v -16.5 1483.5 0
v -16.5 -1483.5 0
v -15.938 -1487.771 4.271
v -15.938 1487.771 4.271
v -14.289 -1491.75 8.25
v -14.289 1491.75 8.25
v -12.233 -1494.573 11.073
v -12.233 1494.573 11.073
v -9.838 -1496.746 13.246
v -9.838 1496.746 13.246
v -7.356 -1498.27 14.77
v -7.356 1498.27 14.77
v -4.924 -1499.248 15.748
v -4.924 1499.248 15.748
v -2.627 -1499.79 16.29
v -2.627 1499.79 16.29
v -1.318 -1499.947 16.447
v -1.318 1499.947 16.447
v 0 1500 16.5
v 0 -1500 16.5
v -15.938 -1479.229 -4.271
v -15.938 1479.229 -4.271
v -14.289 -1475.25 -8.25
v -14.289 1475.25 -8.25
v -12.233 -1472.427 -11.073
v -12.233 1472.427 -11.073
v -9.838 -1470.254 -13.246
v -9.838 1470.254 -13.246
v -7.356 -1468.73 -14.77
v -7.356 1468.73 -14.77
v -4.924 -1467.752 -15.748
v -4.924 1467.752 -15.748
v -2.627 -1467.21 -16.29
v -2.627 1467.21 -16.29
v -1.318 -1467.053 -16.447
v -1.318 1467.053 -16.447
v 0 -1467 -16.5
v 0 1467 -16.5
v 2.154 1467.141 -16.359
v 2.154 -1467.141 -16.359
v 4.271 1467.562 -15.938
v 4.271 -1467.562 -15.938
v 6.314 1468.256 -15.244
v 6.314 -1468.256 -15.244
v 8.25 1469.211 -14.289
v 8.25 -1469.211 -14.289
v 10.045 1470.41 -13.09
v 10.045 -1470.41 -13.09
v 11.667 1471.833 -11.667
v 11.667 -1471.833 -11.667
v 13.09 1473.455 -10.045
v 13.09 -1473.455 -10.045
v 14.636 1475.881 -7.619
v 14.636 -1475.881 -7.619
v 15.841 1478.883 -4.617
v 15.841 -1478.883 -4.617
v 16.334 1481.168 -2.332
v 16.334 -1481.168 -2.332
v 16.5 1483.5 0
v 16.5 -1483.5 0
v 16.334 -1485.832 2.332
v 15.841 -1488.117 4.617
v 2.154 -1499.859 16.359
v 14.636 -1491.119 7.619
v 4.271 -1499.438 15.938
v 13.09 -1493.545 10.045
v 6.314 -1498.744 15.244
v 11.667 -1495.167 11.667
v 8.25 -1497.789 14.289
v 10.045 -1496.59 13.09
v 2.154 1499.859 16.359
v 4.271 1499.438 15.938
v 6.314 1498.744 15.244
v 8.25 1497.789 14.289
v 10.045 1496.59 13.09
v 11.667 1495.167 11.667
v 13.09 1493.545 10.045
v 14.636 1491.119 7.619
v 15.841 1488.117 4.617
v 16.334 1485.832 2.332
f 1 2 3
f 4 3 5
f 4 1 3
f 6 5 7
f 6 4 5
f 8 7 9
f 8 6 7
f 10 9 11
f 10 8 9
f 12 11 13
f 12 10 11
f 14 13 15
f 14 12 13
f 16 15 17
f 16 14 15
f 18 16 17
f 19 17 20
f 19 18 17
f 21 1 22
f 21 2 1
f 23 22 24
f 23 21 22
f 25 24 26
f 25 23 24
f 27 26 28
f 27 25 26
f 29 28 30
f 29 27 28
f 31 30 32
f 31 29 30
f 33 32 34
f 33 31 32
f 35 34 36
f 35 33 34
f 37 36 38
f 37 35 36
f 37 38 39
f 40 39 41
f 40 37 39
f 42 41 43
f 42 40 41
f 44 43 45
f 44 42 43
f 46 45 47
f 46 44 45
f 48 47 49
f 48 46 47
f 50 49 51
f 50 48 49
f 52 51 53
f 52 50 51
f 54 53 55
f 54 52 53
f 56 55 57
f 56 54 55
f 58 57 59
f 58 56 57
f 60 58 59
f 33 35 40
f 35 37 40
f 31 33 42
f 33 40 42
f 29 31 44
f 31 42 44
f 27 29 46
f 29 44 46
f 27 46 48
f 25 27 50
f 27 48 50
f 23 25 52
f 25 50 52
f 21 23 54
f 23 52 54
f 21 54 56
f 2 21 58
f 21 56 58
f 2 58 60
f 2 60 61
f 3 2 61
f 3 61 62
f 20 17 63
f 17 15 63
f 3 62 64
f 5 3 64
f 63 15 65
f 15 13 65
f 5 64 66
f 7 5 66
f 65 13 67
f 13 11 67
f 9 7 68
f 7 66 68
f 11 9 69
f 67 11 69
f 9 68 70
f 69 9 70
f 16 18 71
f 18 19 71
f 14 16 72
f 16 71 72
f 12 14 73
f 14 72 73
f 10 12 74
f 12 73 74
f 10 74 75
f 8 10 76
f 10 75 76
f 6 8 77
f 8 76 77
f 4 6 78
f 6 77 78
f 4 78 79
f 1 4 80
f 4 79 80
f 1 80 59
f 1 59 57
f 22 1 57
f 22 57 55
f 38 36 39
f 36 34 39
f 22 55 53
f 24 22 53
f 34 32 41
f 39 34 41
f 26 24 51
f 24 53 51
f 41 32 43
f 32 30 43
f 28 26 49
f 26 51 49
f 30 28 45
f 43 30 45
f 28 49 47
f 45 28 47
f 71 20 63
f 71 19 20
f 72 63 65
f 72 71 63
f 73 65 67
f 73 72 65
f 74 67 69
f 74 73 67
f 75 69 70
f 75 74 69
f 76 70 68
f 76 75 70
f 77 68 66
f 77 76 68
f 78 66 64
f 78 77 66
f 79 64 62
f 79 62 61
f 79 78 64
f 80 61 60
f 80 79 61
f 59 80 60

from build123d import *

# Parameters (mm, degrees)
F0_W     = 33
F0_H     = 33
F1_DEPTH = 1500
F3_DEPTH = 50
F4_R     = 16.49999


# Not quite as in the source:
# - a fillet or chamfer is up to 0.001 mm smaller than in the source, because OpenCascade refuses the exact size


with BuildPart() as f1:
    # F0 (on Front) → F1 (new body, symmetric)
    with BuildSketch(Plane.XZ):
        Rectangle(F0_W, F0_H)
    extrude(amount=F1_DEPTH, both=True)

    # F2 (on face) → F3 (cut)
    with BuildSketch(Plane.YZ.offset(16.5)):
        Polygon((1500, -16.5), (1500, 16.5), (1467, -16.5), align=None)
        Polygon((-1467, -16.5), (-1500, 16.5), (-1500, -16.5), align=None)
    extrude(amount=-F3_DEPTH, mode=Mode.SUBTRACT)

    # F4 (radius 16.5 in the source; OpenCascade refuses exactly that, so slightly less here)
    f4_edges = [f1.edges().sort_by_distance(p)[0] for p in [
        (16.5, 0, 16.5),
        (16.5, 0, -16.5),
        (-16.5, 0, -16.5),
        (-16.5, 0, 16.5),
    ]]
    fillet(f4_edges, radius=F4_R)


solid = f1.part
